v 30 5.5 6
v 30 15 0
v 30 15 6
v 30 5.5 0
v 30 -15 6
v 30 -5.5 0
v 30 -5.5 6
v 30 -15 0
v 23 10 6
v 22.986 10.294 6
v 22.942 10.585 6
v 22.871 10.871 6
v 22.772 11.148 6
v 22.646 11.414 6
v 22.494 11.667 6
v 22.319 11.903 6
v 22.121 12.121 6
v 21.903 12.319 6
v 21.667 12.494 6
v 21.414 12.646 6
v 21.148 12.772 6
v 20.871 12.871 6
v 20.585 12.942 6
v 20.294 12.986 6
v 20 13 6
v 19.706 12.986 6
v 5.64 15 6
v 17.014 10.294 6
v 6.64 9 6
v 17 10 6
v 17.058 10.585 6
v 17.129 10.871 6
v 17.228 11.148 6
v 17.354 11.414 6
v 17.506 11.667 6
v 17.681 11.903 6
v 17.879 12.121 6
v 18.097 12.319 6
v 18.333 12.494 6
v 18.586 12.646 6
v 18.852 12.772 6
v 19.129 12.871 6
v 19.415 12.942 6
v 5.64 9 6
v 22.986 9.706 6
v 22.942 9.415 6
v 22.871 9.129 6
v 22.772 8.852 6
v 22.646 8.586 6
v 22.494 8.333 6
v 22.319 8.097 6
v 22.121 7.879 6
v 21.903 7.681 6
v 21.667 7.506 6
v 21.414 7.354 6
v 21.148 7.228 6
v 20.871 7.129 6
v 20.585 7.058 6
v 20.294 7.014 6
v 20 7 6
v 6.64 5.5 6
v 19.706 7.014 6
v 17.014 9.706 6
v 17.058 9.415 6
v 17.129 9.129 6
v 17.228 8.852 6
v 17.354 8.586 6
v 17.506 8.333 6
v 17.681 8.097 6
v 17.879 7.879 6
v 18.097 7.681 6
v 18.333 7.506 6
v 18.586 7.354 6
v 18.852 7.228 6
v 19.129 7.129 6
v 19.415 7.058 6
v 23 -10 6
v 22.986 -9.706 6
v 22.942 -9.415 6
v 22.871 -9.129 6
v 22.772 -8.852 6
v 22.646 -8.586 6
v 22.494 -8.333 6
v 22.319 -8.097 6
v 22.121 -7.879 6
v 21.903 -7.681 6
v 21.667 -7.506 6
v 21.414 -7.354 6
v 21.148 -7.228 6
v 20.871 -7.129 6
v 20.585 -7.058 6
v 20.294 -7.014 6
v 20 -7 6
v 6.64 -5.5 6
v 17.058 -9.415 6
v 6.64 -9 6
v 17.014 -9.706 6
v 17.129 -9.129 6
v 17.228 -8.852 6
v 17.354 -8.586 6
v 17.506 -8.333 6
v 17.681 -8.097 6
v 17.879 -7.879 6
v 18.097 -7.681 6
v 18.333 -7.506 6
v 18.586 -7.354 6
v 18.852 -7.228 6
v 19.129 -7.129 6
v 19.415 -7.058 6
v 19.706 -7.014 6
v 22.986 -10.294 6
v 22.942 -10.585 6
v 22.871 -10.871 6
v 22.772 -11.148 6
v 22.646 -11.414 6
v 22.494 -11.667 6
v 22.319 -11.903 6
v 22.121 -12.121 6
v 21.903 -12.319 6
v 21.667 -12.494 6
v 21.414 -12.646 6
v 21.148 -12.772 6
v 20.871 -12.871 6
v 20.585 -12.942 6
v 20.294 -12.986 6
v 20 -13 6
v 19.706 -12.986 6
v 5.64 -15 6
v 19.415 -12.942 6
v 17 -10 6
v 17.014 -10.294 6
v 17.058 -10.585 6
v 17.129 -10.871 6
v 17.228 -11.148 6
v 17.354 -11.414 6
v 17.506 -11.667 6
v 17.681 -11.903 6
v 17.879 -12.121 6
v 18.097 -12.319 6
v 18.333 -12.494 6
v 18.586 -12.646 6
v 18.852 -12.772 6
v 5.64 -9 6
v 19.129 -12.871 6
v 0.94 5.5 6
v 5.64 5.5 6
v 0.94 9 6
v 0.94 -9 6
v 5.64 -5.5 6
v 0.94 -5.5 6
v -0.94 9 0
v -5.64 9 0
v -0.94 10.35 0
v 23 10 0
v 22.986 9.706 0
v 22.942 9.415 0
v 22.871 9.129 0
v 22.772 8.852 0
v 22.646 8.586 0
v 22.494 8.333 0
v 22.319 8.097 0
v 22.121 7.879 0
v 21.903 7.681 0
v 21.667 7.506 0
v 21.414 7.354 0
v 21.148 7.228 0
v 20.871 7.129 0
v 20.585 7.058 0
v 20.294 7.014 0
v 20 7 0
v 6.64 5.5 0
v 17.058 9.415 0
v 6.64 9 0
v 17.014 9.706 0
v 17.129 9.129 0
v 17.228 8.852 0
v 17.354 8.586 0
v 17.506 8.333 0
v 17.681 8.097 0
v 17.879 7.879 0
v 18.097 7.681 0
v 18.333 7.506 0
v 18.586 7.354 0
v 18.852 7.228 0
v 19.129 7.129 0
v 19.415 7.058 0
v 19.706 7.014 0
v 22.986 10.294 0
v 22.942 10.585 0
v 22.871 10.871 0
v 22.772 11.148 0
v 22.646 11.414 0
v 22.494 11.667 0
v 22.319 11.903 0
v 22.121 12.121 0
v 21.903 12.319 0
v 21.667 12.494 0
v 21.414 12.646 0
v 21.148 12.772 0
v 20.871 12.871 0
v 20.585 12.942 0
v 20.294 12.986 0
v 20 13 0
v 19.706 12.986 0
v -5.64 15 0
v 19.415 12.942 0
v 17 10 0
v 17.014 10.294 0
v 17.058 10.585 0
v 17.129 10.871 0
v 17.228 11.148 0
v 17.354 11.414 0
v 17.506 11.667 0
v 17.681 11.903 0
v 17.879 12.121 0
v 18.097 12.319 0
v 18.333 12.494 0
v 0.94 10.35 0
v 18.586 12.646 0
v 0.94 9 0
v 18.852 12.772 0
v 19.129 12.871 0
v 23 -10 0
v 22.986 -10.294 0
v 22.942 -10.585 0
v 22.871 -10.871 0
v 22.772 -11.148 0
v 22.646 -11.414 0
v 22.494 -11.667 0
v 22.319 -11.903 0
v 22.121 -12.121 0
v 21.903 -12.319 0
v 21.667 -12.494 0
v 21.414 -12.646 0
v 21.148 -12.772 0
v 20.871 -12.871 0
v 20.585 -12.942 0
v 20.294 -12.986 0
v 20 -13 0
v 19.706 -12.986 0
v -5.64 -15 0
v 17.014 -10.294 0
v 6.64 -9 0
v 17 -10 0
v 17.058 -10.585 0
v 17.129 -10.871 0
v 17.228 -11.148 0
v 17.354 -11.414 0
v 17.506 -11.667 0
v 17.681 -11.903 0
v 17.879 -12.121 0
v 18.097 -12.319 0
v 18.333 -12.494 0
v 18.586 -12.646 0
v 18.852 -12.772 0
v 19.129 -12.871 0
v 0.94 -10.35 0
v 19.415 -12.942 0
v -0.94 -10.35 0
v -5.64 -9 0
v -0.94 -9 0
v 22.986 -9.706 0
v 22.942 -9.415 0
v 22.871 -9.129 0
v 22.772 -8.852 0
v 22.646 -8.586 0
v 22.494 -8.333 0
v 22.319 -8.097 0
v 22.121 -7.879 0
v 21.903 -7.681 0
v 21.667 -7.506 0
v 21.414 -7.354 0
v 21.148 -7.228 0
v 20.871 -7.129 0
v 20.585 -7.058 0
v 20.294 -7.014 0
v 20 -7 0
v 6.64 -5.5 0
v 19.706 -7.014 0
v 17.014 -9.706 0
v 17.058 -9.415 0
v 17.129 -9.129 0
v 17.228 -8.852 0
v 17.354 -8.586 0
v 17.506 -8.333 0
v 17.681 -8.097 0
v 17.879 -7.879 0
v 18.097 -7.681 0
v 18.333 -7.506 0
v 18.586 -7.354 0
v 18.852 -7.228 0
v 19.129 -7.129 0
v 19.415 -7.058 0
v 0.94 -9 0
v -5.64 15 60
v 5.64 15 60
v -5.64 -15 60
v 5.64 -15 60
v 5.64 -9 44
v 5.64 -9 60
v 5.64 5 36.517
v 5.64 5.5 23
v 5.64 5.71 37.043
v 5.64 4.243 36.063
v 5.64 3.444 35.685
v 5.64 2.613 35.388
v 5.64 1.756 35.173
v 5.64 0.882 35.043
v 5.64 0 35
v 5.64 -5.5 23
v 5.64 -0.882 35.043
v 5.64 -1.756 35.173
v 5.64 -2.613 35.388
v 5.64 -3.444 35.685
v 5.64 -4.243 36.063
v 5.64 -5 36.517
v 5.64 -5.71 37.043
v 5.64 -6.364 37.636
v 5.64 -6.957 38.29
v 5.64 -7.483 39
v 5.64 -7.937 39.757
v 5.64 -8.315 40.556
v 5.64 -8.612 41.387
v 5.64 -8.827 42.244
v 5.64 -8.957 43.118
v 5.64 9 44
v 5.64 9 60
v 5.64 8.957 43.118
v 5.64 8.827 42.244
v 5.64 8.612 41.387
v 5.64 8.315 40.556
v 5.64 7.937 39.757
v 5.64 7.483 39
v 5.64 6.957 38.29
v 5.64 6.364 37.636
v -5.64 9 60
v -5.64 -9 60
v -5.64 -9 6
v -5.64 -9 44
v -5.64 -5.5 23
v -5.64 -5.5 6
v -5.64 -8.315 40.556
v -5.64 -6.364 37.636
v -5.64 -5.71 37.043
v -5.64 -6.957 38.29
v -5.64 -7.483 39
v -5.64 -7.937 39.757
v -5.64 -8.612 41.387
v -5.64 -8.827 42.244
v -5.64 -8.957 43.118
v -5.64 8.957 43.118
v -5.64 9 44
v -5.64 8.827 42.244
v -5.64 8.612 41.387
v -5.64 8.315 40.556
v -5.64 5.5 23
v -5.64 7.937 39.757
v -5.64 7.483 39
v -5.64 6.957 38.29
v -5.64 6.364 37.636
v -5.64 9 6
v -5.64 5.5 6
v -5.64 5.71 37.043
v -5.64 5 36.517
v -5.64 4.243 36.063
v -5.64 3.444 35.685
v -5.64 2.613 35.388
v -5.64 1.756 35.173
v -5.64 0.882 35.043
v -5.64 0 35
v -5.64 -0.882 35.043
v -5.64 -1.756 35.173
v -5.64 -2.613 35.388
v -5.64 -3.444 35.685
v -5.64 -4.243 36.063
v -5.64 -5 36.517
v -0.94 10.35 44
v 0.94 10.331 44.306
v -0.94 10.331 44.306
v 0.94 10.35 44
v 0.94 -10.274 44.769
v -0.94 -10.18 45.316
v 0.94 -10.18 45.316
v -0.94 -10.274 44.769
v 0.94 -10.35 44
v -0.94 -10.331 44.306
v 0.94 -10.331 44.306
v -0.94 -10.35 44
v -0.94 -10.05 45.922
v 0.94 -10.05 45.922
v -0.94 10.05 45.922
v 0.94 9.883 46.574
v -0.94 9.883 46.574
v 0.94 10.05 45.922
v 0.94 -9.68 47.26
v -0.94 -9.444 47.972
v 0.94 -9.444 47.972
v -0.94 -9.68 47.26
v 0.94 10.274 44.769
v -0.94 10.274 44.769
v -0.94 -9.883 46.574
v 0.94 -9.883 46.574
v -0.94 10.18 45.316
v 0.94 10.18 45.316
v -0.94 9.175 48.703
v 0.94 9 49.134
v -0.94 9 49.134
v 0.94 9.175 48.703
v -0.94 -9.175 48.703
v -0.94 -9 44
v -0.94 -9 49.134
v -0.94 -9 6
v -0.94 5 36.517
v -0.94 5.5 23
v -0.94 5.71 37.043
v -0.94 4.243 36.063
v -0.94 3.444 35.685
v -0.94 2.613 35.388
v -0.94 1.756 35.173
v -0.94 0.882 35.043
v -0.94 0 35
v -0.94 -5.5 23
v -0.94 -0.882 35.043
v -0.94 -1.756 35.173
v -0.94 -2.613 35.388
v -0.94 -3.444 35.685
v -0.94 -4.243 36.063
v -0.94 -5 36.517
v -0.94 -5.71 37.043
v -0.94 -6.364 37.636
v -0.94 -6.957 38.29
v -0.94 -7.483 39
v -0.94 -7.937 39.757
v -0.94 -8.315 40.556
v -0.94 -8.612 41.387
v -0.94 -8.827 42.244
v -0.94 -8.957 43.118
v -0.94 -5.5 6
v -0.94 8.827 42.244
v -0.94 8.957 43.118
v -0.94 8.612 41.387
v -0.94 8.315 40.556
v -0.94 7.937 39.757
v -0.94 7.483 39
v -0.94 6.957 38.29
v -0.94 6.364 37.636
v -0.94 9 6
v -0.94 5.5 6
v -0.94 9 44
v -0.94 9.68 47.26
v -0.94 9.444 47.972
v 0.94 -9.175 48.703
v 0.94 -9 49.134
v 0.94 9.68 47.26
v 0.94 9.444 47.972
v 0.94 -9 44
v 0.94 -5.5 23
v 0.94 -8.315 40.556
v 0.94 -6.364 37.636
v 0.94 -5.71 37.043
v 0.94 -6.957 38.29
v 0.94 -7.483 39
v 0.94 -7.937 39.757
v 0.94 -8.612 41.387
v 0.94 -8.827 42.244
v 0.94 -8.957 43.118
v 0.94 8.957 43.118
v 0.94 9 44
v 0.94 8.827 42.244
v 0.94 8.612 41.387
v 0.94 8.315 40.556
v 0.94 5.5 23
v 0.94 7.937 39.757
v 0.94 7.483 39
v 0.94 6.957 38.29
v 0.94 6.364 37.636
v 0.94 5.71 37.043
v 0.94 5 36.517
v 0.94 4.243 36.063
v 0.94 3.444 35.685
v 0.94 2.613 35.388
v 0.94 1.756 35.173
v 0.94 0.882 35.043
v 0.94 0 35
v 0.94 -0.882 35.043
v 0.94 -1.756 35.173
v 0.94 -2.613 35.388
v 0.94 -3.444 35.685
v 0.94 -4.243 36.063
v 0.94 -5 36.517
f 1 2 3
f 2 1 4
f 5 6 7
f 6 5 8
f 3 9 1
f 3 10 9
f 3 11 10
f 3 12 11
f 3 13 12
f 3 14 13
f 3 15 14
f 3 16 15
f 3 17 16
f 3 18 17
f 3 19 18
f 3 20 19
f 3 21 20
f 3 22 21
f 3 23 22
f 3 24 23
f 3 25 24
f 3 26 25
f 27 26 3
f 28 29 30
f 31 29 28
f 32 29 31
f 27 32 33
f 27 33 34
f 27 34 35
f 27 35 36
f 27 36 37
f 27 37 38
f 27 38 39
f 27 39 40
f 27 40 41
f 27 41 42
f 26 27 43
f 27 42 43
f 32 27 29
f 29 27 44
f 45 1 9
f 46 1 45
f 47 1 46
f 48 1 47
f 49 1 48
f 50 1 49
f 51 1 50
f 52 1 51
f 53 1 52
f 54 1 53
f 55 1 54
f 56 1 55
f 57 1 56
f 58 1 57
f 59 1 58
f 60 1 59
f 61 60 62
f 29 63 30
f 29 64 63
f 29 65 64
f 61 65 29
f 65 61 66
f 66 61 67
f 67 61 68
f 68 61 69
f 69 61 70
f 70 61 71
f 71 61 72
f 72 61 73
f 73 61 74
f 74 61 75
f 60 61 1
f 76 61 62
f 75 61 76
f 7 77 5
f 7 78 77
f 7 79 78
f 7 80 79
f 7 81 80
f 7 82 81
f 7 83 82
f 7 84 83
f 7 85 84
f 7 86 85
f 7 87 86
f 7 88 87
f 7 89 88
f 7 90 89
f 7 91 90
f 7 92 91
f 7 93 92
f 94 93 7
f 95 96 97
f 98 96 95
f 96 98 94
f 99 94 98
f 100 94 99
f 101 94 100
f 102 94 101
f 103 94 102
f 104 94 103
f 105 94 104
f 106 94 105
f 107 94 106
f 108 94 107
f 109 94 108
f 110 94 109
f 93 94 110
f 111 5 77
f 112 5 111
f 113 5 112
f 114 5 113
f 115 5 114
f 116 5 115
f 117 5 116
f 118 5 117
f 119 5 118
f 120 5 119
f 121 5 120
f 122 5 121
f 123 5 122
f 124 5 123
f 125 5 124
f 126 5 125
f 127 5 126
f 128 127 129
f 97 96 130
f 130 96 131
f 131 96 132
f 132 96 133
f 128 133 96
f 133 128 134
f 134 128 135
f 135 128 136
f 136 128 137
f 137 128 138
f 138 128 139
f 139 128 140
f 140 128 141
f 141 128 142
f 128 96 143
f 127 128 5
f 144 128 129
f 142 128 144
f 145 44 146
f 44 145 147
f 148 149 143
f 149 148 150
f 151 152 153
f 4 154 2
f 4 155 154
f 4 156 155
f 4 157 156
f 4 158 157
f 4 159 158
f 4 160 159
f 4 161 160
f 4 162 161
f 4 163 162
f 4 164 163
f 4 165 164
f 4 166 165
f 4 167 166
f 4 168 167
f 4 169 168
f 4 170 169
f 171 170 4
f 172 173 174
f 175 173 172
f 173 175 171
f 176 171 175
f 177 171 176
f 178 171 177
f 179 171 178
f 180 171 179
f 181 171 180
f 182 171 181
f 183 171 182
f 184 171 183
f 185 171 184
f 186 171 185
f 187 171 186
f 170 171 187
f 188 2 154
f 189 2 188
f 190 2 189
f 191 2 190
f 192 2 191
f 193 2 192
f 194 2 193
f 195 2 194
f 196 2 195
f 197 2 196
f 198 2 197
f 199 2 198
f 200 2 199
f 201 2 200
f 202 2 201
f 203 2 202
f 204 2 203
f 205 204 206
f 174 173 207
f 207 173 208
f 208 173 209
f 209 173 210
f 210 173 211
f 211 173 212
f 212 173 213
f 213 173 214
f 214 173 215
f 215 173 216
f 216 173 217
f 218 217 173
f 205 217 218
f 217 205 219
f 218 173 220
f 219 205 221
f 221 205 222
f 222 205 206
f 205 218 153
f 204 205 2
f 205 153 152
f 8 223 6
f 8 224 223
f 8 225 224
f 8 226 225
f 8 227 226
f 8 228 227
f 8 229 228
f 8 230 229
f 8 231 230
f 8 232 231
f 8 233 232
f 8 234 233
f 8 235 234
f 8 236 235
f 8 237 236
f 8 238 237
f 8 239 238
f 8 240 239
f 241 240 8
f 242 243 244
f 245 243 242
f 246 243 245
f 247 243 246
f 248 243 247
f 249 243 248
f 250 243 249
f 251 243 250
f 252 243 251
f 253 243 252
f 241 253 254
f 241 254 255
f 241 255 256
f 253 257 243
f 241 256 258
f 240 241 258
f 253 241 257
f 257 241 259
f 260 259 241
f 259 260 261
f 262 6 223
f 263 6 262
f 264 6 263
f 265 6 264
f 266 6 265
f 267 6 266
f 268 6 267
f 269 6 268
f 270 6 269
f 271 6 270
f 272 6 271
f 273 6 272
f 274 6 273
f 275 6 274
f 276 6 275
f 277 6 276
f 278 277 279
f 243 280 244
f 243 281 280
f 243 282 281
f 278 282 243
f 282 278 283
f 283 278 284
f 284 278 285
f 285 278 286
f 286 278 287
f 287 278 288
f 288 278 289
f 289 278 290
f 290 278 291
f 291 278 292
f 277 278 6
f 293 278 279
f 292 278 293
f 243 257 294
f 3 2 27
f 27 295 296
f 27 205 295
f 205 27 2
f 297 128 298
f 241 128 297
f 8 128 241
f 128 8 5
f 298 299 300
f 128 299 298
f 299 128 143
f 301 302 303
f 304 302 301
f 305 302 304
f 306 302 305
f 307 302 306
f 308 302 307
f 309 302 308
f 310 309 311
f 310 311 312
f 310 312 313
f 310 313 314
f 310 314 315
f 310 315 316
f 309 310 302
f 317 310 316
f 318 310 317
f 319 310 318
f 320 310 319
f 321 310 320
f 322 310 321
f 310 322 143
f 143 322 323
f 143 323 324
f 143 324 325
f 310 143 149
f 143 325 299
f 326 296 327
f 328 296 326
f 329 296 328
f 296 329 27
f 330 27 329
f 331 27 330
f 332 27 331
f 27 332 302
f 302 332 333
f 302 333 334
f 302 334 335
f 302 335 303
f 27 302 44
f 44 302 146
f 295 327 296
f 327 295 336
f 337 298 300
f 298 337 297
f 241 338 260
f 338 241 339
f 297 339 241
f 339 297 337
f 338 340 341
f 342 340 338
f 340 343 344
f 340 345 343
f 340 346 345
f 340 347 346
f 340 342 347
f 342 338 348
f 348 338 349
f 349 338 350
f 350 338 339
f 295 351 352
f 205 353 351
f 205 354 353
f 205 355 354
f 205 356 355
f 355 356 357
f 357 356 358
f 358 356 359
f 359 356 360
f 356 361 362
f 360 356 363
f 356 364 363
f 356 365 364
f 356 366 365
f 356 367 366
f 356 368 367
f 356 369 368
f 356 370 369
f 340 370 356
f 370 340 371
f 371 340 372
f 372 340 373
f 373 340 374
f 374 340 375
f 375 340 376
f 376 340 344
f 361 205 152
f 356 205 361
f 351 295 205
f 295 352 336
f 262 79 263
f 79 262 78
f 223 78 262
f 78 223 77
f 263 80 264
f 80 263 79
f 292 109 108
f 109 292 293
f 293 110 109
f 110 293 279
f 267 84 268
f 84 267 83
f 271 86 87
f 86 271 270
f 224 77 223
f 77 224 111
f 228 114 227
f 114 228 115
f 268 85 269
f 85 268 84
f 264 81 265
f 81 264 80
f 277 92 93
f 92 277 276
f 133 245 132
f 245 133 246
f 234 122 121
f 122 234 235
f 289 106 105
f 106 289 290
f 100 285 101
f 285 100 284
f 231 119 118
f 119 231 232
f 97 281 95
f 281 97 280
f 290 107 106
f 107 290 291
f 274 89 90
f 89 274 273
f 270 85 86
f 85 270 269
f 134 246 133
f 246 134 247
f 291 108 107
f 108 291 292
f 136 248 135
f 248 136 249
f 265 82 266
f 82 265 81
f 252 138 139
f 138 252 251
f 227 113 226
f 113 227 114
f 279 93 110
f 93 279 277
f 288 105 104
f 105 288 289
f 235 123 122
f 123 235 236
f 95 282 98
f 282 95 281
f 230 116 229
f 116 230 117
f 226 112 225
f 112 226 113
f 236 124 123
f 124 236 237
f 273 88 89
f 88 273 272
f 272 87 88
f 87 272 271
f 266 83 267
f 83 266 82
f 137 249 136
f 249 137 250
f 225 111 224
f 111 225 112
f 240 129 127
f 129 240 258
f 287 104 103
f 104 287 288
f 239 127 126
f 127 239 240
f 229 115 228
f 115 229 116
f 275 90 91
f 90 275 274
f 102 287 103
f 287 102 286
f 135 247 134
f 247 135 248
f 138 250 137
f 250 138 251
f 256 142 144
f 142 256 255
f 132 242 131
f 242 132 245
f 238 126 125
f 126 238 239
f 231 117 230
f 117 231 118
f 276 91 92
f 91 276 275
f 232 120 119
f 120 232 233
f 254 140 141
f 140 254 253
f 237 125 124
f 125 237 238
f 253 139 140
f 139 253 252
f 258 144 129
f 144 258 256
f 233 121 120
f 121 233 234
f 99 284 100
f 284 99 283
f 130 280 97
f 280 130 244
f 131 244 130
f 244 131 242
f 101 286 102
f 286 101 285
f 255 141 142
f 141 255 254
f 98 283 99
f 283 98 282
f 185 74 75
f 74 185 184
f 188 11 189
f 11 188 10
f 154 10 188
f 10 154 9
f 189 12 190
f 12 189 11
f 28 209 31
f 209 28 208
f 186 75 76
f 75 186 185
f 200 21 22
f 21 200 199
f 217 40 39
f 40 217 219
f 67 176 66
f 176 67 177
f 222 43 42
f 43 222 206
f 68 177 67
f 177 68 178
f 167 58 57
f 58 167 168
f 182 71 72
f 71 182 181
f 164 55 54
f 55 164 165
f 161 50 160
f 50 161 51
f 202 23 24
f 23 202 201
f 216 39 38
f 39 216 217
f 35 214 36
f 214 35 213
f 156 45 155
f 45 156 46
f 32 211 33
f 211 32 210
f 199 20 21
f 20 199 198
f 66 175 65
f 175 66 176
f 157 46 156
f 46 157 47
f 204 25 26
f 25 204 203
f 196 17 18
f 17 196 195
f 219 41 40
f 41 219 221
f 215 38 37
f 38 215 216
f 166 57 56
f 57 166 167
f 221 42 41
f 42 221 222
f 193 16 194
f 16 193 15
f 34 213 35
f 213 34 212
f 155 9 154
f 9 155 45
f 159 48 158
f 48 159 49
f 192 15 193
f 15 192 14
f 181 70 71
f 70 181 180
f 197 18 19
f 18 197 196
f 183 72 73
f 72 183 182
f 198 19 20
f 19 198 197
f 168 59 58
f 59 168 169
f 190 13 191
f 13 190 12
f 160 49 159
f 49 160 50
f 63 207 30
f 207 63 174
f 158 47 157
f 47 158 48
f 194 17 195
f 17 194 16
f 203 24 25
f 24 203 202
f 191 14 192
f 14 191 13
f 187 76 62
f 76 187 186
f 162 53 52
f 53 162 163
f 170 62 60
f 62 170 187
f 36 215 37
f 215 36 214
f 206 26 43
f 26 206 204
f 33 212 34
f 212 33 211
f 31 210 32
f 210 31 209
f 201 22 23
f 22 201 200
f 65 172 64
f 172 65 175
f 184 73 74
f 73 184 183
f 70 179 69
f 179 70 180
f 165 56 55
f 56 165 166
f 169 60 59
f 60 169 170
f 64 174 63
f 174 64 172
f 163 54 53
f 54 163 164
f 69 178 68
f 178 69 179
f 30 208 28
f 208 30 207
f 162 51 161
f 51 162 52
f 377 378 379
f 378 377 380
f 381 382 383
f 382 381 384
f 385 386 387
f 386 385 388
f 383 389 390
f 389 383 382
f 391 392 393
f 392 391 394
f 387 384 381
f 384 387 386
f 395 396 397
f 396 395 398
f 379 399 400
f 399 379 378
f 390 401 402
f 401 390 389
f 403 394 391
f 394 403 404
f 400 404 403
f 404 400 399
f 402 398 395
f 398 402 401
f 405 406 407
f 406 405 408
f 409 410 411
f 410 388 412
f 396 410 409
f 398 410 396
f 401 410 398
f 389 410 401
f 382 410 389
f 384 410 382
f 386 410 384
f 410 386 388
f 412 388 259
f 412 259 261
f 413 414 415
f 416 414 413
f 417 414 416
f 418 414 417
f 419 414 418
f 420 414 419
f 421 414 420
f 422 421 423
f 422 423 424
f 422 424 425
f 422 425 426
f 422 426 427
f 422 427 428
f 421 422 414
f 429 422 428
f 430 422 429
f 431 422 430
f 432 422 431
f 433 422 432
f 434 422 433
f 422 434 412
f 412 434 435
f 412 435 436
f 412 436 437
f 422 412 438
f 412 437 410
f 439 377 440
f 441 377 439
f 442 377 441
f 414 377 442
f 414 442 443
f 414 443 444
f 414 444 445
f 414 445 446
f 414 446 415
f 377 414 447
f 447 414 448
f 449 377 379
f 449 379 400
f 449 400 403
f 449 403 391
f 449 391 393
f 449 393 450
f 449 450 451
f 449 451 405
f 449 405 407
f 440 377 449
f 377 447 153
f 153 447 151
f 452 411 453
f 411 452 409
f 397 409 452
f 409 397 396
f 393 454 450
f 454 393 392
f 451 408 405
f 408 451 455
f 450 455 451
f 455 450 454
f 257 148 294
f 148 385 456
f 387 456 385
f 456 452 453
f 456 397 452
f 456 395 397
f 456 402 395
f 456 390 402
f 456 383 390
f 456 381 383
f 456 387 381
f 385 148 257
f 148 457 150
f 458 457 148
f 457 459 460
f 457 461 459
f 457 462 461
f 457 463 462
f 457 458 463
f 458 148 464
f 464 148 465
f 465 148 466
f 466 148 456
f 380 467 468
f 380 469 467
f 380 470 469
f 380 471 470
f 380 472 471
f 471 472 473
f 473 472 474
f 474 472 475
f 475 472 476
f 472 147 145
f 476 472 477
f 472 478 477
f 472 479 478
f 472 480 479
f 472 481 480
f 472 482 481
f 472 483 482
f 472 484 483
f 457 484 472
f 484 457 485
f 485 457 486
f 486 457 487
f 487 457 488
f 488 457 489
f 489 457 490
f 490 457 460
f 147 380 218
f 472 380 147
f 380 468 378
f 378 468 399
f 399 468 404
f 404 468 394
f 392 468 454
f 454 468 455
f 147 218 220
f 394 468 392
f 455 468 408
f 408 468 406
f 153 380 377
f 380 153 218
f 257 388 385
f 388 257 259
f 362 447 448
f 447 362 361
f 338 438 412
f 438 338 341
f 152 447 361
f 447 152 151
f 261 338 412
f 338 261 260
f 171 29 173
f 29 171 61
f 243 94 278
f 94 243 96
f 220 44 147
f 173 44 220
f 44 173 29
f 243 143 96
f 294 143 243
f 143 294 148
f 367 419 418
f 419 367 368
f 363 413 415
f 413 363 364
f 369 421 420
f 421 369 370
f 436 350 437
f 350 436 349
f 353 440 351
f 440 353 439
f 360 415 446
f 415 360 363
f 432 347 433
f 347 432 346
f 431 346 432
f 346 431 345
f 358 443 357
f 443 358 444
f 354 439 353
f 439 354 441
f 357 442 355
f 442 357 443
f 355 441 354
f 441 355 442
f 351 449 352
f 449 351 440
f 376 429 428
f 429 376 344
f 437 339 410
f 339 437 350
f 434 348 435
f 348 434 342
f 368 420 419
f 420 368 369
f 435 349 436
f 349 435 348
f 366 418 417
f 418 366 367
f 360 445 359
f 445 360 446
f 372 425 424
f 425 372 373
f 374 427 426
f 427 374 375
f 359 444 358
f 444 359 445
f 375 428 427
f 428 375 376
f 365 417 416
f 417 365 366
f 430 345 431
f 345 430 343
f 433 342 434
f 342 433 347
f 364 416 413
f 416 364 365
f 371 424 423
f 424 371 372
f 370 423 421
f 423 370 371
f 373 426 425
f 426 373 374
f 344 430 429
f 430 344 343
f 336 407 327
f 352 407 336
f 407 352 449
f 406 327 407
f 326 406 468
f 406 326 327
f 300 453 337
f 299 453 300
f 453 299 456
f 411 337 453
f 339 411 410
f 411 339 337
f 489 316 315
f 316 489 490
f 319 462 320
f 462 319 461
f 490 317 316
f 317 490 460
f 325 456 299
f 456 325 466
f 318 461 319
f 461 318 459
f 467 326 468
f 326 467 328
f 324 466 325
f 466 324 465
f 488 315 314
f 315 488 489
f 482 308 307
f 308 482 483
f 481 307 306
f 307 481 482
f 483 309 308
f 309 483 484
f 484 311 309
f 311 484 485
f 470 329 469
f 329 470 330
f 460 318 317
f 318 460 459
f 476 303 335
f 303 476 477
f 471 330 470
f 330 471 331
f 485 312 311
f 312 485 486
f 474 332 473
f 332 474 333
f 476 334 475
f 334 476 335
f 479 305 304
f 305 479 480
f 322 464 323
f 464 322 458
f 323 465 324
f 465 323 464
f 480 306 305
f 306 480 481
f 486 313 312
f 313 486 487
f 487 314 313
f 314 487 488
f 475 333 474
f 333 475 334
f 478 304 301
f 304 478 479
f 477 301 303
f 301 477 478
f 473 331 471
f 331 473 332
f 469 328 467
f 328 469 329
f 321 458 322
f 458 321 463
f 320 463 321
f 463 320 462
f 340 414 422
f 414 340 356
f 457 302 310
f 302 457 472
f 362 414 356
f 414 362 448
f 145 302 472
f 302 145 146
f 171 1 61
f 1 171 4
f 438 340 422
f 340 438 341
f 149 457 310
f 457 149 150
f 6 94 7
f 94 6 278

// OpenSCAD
// ============================================================
//  法兰夹 —— 从上方套下（方管），螺丝孔在 X 轴上
//  坐标：针筒轴 = X；法兰 = 垂直于 X 的"卡片"
//  ============================================================

// ---- 实测(占位) ----
flange_t = 1.28;  // 法兰厚(沿 X)
flange_w = 22;    // 槽 Y 向(法兰水平方向 19.5 + 余量)；法兰的 30 那面朝上下的 Z
barrel_d = 16.5;  // 筒身外径(10mL)
rod_d    = 13.44; // 活塞杆直径
axis_h   = 44;    // 轴心高度(底座上方；= 滑块顶面28.5 + 连轴夹腿15.5)

// ---- 结构 ----
jaw_t    = 5;     // 夹壁厚(X)
sw       = 4;     // 侧壁厚(Y)
H        = 60;    // 管体高（容纳 axis_h=44 处竖直 30 的法兰）
open_d   = 18;    // 前后开口大小(筒身16.5，留余量)
Bx       = 14;    // 底座 X 负向半宽
Bxp      = 36;    // 底座 X 正向(伸出去放螺丝孔)
Bt       = 6;     // 底座厚
hole_sp  = 20;    // 螺丝孔距(沿 X)
hole_d   = 6;     // 螺丝孔直径

$fn = 64;

// 法兰轮廓（YZ 平面内的圆润叶片形：19.5 宽 × 30 高，尖朝上下）+ 单边余量
flange_clr = 0.6;   // 凹槽相对法兰的单边余量
flange_pt = [ for (i = [0:119]) let(t = 360*i/120, c = cos(t), s = sin(t))
                [ (15+flange_clr)*sign(c)*pow(abs(c), 1.333), (9.75+flange_clr)*sign(s)*pow(abs(s), 1.333) ] ];

module flange_clamp() {
    Xw = flange_t/2 + jaw_t;    // 管体 X 半宽
    Yw = flange_w/2 + sw;       // 管体 Y 半宽

    difference() {
        union() {
            // 底板：从管体接出，连到螺丝孔那一块（Y 向尺寸 30）
            translate([5, -15, 0]) cube([25, 30, Bt]);
            // 管体
            translate([-Xw, -Yw, 0]) cube([2*Xw, 2*Yw, H]);
        }

        // 中央法兰凹槽：按法兰轮廓（圆润叶片形，竖放），薄片
        translate([0, 0, axis_h]) rotate([0,90,0])
            linear_extrude(height = flange_t + 0.6, center = true)
                polygon(points = flange_pt);
        // 下方直槽：便于从下往上把法兰套进去
        translate([-(flange_t + 0.6)/2, -(9.75+flange_clr), -1])
            cube([flange_t + 0.6, 2*(9.75+flange_clr), axis_h + 1]);

        // 下：留 6 高的空
        translate([-Xw - 1, -open_d/2, -1])
            cube([Xw + 1 - flange_t/2 + 1, open_d, 7]);
        translate([flange_t/2 - 1, -open_d/2, -1])
            cube([Xw + 1 - flange_t/2 + 1, open_d, 7]);

        // 上开口：弧形（按筒身圆做圆口）+ 向上开通到顶
        translate([-Xw - 1, 0, axis_h]) rotate([0,90,0])
            cylinder(d = open_d, h = Xw + 1 - flange_t/2 + 1);
        translate([-Xw - 1, -open_d/2, axis_h])
            cube([Xw + 1 - flange_t/2 + 1, open_d, H - axis_h + 2]);
        translate([flange_t/2 - 1, 0, axis_h]) rotate([0,90,0])
            cylinder(d = open_d, h = Xw + 1 - flange_t/2 + 1);
        translate([flange_t/2 - 1, -open_d/2, axis_h])
            cube([Xw + 1 - flange_t/2 + 1, open_d, H - axis_h + 2]);

        // 中间挖空（跨金属条 + 空隙 + 丝杆）：11 宽、24 高
        translate([-Xw - 1, -5.5, -1])
            cube([39, 11, 24]);

        // 2 个螺丝孔（关于 X 轴对称：x=+20, y=±10）
        for (sy = [-1, 1])
            translate([20, sy*hole_sp/2, -1])
                cylinder(d = hole_d, h = Bt + 2);
    }
}

flange_clamp();
// 样式对了再换实测尺寸
